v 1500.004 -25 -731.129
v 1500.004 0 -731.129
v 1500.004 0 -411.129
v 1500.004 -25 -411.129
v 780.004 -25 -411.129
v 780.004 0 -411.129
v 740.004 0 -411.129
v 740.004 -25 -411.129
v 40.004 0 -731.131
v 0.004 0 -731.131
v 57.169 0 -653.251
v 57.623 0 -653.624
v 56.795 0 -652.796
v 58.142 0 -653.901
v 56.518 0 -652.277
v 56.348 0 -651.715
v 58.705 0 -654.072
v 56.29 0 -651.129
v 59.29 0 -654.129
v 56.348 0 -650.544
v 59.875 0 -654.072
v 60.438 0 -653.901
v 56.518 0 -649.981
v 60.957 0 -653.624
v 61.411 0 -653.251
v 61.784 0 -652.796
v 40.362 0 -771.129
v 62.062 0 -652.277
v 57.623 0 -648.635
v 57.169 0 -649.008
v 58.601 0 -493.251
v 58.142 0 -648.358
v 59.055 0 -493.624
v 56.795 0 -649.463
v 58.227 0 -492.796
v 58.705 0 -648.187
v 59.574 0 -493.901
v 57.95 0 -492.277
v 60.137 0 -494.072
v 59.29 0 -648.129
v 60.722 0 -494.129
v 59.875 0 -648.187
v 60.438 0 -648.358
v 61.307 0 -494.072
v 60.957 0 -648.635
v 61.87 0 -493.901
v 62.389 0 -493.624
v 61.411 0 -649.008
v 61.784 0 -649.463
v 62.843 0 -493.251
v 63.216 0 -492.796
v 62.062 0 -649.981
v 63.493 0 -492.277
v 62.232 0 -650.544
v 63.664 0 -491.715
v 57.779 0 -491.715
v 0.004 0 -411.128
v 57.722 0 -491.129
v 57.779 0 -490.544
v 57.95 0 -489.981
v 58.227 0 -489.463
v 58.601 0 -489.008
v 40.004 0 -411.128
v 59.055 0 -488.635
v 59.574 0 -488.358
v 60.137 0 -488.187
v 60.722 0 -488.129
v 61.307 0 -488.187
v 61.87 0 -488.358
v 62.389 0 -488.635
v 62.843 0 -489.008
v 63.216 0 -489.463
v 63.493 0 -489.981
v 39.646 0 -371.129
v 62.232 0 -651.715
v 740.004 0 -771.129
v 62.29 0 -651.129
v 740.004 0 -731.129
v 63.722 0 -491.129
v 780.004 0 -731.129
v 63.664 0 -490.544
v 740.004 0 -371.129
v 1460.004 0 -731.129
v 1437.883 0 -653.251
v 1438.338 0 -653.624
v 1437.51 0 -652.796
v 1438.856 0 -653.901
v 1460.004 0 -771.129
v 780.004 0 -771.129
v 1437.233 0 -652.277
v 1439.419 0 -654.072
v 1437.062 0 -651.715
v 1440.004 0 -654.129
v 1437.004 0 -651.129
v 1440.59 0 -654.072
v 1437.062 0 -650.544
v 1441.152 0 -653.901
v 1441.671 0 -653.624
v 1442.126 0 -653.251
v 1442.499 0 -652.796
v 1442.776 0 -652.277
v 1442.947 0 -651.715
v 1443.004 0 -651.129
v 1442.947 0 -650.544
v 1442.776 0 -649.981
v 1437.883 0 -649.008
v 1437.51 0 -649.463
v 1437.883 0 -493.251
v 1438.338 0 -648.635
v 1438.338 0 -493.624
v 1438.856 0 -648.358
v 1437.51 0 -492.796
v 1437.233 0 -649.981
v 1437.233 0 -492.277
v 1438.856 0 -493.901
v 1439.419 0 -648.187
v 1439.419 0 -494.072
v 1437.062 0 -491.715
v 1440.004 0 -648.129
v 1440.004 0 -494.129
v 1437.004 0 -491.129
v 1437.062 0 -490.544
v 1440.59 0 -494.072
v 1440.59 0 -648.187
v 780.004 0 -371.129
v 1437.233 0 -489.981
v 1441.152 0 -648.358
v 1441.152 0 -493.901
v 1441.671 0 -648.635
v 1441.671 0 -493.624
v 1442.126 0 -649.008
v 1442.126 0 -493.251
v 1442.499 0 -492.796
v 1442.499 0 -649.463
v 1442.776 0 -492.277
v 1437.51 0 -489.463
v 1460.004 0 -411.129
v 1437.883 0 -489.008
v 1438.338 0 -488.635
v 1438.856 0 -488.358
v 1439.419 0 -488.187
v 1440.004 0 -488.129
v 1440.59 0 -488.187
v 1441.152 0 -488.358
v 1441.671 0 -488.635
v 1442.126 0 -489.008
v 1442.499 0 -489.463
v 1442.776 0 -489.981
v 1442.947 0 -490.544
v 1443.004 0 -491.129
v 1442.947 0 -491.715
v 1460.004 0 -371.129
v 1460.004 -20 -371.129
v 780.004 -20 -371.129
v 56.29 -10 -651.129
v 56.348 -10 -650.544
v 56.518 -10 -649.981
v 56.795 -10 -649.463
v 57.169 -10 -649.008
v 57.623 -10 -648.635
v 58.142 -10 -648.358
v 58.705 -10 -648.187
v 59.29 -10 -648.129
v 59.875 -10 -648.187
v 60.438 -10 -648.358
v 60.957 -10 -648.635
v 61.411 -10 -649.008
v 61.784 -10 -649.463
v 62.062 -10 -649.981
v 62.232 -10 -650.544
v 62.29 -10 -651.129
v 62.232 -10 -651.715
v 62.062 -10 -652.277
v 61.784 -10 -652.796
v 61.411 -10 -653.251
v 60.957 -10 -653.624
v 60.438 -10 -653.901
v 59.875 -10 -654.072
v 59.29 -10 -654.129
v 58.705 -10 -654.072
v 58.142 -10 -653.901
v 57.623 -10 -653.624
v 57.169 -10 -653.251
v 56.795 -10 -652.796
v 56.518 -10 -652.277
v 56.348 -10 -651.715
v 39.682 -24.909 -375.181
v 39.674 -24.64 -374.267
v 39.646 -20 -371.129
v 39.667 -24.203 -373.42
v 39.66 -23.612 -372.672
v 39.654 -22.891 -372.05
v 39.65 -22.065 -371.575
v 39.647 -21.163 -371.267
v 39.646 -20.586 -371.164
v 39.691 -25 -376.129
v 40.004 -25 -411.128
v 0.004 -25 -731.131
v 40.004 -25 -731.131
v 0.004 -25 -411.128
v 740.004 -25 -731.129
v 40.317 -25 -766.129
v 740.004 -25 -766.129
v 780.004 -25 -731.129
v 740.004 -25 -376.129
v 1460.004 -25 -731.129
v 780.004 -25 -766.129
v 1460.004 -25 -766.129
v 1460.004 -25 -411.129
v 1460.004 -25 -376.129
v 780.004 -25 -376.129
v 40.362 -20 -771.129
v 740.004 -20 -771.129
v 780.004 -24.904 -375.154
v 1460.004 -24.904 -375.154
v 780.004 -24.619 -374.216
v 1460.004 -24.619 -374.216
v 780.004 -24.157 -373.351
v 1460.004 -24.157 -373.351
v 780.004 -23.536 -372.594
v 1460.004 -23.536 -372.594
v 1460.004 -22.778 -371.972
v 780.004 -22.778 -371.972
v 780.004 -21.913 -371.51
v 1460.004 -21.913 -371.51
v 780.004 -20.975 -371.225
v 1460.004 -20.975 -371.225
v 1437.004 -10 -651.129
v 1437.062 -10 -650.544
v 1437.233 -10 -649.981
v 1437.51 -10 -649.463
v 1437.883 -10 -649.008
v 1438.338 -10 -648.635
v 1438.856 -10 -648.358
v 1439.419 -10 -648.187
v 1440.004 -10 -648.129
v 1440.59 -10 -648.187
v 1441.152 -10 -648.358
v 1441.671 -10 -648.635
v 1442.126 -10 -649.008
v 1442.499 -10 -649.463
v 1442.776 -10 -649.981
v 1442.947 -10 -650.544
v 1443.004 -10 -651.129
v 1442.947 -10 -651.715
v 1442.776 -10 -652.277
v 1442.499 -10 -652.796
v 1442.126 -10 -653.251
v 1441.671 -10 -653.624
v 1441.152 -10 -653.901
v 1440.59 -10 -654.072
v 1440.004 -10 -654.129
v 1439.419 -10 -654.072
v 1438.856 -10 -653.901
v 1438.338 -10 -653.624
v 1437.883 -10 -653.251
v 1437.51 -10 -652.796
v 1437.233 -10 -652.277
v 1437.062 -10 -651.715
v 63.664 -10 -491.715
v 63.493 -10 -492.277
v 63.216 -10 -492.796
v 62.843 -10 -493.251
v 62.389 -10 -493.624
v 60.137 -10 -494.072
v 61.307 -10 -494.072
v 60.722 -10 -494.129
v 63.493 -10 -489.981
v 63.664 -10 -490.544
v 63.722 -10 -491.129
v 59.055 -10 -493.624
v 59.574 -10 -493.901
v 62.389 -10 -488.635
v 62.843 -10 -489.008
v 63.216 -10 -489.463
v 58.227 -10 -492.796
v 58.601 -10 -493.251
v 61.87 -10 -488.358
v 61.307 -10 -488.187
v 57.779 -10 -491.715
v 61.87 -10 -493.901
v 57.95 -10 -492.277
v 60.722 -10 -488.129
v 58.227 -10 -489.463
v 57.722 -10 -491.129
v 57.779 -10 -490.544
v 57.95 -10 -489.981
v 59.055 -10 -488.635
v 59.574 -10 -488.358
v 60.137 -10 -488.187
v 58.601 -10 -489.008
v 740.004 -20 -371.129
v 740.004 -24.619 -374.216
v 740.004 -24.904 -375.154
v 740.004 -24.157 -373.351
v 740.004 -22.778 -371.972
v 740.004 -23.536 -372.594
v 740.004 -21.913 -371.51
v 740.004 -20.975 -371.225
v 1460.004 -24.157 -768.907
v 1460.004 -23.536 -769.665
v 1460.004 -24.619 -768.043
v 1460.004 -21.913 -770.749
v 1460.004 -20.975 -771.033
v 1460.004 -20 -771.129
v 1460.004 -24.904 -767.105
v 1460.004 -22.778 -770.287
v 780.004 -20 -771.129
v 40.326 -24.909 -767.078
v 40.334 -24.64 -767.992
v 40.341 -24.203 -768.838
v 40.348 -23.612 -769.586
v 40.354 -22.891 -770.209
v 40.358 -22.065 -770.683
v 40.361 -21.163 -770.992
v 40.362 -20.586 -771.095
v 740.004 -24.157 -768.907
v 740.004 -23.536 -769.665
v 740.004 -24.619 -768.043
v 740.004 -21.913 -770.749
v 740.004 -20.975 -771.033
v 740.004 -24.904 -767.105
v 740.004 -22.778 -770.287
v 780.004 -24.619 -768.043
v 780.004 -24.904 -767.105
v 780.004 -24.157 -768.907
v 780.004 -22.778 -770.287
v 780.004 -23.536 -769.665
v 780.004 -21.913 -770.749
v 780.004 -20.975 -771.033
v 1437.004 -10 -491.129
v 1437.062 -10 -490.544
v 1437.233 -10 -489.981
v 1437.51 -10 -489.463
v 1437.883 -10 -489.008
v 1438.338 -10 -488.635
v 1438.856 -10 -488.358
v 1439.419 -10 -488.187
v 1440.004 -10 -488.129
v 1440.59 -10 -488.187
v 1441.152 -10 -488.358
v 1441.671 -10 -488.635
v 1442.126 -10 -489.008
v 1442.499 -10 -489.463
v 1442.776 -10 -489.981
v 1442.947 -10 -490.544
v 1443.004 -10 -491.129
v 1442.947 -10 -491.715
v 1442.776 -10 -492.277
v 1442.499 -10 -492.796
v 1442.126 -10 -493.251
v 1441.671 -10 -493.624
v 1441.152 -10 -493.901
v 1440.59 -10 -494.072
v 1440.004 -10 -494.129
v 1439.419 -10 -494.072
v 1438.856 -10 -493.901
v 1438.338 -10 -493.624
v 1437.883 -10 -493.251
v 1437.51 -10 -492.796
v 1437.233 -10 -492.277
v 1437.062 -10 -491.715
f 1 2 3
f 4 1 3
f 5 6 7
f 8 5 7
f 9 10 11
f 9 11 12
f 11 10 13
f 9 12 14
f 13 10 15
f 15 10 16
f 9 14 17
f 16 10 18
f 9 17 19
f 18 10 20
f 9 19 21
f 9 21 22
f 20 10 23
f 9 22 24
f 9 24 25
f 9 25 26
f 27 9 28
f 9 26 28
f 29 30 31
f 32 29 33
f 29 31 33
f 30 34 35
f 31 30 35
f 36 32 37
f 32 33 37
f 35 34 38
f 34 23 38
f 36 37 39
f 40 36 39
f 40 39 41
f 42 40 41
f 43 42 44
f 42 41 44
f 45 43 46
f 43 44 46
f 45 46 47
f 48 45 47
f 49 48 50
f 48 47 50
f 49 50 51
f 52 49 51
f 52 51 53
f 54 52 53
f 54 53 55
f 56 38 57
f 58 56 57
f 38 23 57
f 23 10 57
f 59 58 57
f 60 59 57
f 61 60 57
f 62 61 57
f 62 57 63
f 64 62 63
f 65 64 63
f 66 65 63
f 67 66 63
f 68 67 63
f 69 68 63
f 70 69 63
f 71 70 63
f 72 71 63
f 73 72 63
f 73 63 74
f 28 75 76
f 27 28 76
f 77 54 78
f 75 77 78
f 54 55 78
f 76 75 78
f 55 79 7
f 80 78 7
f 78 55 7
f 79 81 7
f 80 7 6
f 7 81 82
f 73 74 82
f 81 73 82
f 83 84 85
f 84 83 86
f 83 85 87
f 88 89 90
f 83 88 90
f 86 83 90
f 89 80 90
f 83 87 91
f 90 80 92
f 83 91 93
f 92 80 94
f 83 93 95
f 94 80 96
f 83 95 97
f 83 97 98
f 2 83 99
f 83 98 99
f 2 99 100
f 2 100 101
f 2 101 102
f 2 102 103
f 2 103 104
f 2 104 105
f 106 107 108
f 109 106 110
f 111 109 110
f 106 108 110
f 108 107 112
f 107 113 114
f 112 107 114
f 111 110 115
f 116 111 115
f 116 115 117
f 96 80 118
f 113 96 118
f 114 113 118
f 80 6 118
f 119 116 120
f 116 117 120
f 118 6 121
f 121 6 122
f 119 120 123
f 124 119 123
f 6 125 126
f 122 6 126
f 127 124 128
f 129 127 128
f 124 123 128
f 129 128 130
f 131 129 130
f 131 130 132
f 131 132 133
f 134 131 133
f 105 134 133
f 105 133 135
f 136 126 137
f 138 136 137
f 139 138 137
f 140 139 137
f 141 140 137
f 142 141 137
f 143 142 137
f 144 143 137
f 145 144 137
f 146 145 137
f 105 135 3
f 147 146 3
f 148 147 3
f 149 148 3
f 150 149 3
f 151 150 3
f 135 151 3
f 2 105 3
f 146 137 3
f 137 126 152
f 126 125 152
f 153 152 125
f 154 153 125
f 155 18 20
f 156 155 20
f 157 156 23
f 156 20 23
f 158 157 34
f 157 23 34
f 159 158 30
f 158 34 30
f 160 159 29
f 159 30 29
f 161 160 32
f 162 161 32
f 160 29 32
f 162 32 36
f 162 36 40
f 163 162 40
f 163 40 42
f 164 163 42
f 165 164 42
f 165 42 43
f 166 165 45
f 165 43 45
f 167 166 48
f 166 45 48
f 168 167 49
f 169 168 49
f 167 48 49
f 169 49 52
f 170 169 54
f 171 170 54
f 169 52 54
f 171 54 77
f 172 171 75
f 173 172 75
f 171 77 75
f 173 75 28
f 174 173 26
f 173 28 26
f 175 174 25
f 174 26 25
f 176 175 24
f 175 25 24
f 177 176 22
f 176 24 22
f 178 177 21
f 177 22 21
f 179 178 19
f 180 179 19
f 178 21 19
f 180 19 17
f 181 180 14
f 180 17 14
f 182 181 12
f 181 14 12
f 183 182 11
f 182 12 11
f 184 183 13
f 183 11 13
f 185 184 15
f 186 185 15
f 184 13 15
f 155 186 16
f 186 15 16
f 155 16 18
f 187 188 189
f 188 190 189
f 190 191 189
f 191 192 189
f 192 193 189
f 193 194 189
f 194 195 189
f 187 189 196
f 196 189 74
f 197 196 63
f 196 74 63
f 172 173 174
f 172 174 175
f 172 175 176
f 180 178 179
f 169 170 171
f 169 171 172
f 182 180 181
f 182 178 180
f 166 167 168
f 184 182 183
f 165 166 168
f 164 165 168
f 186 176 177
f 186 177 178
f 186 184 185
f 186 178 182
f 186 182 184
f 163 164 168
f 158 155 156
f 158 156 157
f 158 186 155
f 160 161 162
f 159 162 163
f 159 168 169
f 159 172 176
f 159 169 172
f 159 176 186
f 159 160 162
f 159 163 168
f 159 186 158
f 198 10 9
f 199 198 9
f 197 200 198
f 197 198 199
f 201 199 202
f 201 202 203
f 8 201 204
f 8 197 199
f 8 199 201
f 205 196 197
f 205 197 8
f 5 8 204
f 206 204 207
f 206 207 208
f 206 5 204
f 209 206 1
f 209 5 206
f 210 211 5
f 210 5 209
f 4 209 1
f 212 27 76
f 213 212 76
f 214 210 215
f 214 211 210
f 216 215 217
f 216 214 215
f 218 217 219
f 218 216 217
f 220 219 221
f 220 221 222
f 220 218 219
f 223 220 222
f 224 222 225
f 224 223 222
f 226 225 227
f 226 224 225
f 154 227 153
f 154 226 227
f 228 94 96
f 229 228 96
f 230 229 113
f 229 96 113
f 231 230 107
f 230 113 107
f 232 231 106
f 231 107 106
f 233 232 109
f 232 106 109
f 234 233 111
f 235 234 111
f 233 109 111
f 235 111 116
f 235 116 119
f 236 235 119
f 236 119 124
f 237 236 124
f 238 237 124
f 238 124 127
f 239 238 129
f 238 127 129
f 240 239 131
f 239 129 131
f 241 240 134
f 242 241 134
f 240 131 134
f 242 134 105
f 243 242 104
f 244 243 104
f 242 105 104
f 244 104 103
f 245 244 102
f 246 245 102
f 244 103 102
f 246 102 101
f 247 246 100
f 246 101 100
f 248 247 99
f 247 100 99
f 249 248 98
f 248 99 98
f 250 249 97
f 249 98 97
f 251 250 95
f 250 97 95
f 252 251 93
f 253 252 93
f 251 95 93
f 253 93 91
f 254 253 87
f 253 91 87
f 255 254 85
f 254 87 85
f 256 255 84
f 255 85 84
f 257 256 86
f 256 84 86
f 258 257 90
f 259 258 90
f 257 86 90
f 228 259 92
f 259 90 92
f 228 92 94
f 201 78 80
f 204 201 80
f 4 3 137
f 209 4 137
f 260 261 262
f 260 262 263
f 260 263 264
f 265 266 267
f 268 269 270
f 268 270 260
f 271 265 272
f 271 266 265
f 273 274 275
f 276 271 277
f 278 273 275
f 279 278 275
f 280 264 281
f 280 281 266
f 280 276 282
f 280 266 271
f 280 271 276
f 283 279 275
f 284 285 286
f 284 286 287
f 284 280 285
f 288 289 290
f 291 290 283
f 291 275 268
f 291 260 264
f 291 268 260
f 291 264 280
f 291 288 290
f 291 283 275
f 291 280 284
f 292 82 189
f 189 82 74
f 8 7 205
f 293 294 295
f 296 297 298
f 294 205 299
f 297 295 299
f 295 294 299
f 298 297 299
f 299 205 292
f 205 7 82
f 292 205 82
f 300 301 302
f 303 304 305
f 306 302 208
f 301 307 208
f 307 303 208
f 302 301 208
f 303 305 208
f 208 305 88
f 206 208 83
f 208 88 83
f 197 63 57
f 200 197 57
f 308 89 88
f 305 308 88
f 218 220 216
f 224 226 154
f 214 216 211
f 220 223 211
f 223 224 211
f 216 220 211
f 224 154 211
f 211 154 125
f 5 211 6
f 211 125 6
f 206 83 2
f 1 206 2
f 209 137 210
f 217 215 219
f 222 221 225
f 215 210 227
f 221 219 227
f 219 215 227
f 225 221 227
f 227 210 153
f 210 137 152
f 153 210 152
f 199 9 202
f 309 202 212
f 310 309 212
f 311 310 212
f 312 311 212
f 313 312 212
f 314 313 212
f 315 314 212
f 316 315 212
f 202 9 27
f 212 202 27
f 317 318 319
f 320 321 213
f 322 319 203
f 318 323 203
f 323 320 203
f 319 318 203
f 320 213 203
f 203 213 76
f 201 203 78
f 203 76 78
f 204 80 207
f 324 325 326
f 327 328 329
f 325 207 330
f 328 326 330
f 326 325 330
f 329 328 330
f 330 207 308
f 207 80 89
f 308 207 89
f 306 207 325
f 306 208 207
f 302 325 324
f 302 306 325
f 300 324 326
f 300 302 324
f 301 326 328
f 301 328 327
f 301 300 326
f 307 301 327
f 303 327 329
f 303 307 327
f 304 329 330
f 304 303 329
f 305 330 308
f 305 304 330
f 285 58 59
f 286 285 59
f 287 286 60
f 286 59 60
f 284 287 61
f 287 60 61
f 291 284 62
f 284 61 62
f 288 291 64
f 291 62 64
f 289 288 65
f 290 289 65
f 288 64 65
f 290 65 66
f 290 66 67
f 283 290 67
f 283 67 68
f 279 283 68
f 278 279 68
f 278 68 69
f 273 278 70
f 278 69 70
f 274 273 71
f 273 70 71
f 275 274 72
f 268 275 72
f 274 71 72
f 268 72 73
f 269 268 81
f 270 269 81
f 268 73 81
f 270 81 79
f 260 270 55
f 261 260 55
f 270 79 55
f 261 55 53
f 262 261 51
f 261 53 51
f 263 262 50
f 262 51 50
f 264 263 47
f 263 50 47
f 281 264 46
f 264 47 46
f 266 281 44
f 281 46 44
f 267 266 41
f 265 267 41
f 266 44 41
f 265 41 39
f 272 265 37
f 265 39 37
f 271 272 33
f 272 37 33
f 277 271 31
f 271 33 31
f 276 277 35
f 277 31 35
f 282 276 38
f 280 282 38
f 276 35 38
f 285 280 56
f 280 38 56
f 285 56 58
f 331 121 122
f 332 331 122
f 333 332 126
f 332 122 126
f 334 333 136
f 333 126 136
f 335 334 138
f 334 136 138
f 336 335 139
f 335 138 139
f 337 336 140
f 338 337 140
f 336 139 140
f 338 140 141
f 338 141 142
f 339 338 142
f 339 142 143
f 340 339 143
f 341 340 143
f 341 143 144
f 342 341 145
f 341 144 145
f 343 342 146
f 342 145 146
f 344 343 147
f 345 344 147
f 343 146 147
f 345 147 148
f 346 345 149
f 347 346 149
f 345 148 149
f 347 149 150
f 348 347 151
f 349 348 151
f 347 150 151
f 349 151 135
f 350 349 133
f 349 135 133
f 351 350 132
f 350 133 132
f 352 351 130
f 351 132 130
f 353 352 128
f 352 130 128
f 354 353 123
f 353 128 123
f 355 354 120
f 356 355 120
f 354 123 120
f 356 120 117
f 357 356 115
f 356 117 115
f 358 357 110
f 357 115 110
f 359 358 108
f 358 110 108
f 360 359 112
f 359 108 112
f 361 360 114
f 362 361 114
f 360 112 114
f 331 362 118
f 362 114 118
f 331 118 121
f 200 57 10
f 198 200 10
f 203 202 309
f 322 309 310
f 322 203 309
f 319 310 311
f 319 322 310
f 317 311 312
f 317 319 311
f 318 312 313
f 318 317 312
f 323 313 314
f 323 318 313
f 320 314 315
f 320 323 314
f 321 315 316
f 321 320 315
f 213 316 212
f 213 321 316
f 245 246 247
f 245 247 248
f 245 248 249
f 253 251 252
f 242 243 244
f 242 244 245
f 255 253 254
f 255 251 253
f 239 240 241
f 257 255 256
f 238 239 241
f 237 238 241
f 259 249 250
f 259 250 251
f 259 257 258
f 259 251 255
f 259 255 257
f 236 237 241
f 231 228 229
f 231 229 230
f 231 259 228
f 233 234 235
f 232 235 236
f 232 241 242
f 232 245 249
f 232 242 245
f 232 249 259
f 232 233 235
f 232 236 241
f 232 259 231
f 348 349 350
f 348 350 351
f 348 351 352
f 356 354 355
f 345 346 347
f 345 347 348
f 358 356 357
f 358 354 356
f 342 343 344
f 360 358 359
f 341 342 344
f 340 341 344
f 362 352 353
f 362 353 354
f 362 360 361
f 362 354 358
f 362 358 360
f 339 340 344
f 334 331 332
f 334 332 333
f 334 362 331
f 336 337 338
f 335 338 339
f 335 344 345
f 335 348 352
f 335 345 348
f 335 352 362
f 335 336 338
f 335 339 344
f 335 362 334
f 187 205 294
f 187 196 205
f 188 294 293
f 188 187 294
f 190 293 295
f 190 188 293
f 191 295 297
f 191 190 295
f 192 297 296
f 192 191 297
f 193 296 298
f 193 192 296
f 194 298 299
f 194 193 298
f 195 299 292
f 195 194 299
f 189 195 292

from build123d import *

# Parameters (mm, degrees)
F0_DEPTH = 25
F1_R     = 3
F2_DEPTH = 10
F7_DEPTH = 10
F3_DEPTH = 10
F4_R     = 5
F5_R     = 5


with BuildPart() as f0:
    # F6 (on Front) → F0 (new body)
    with BuildSketch(Plane.XZ):
        Polygon((780.004344, -771.129271), (1460.004344, -771.129271), (1460.004344, -731.129271), (1500.004344, -731.129271), (1500.004344, -411.129271), (1460.004344, -411.129271), (1460.004344, -371.129271), (780.004344, -371.129271), (780.004344, -411.129271), (740.004344, -411.129271), (740.004344, -371.129271), (39.646024, -371.129271), (40.004344, -411.127666), (0.004344, -411.127666), (0.004344, -731.13087), (40.004344, -731.13087), (40.361955, -771.129271), (740.004344, -771.129271), (740.004344, -731.129271), (780.004344, -731.129271), align=None)
    extrude(amount=F0_DEPTH)

    # F1 (on face) → F2 (cut)
    with BuildSketch(Plane(origin=(0, 0, 0), x_dir=(-1, 0, 0), z_dir=(0, 1, 0))):
        with Locations((-60.721829, -491.129271)):
            Circle(F1_R)
    extrude(amount=-F2_DEPTH, mode=Mode.SUBTRACT)

    # F1 (on face) → F7 (cut)
    with BuildSketch(Plane(origin=(0, 0, 0), x_dir=(-1, 0, 0), z_dir=(0, 1, 0))):
        with Locations((-59.289877, -651.129271)):
            Circle(F1_R)
    extrude(amount=-F7_DEPTH, mode=Mode.SUBTRACT)

    # F1 (on face) → F3 (cut)
    with BuildSketch(Plane(origin=(0, 0, 0), x_dir=(-1, 0, 0), z_dir=(0, 1, 0))):
        with Locations((-60.721829, -491.129271)):
            Circle(F1_R)
        with Locations((-59.289877, -651.129271)):
            Circle(F1_R)
        with Locations((-1440.004344, -651.129271)):
            Circle(F1_R)
        with Locations((-1440.004344, -491.129271)):
            Circle(F1_R)
    extrude(amount=-F3_DEPTH, mode=Mode.SUBTRACT)

    # F4
    f4_edges = [f0.edges().sort_by_distance(p)[0] for p in [
        (389.825184, -25, -371.129271),
        (390.183149, -25, -771.129271),
    ]]
    fillet(f4_edges, radius=F4_R)

    # F5
    f5_edges = [f0.edges().sort_by_distance(p)[0] for p in [
        (1120.004344, -25, -371.129271),
        (1120.004344, -25, -771.129271),
    ]]
    fillet(f5_edges, radius=F5_R)


solid = f0.part
